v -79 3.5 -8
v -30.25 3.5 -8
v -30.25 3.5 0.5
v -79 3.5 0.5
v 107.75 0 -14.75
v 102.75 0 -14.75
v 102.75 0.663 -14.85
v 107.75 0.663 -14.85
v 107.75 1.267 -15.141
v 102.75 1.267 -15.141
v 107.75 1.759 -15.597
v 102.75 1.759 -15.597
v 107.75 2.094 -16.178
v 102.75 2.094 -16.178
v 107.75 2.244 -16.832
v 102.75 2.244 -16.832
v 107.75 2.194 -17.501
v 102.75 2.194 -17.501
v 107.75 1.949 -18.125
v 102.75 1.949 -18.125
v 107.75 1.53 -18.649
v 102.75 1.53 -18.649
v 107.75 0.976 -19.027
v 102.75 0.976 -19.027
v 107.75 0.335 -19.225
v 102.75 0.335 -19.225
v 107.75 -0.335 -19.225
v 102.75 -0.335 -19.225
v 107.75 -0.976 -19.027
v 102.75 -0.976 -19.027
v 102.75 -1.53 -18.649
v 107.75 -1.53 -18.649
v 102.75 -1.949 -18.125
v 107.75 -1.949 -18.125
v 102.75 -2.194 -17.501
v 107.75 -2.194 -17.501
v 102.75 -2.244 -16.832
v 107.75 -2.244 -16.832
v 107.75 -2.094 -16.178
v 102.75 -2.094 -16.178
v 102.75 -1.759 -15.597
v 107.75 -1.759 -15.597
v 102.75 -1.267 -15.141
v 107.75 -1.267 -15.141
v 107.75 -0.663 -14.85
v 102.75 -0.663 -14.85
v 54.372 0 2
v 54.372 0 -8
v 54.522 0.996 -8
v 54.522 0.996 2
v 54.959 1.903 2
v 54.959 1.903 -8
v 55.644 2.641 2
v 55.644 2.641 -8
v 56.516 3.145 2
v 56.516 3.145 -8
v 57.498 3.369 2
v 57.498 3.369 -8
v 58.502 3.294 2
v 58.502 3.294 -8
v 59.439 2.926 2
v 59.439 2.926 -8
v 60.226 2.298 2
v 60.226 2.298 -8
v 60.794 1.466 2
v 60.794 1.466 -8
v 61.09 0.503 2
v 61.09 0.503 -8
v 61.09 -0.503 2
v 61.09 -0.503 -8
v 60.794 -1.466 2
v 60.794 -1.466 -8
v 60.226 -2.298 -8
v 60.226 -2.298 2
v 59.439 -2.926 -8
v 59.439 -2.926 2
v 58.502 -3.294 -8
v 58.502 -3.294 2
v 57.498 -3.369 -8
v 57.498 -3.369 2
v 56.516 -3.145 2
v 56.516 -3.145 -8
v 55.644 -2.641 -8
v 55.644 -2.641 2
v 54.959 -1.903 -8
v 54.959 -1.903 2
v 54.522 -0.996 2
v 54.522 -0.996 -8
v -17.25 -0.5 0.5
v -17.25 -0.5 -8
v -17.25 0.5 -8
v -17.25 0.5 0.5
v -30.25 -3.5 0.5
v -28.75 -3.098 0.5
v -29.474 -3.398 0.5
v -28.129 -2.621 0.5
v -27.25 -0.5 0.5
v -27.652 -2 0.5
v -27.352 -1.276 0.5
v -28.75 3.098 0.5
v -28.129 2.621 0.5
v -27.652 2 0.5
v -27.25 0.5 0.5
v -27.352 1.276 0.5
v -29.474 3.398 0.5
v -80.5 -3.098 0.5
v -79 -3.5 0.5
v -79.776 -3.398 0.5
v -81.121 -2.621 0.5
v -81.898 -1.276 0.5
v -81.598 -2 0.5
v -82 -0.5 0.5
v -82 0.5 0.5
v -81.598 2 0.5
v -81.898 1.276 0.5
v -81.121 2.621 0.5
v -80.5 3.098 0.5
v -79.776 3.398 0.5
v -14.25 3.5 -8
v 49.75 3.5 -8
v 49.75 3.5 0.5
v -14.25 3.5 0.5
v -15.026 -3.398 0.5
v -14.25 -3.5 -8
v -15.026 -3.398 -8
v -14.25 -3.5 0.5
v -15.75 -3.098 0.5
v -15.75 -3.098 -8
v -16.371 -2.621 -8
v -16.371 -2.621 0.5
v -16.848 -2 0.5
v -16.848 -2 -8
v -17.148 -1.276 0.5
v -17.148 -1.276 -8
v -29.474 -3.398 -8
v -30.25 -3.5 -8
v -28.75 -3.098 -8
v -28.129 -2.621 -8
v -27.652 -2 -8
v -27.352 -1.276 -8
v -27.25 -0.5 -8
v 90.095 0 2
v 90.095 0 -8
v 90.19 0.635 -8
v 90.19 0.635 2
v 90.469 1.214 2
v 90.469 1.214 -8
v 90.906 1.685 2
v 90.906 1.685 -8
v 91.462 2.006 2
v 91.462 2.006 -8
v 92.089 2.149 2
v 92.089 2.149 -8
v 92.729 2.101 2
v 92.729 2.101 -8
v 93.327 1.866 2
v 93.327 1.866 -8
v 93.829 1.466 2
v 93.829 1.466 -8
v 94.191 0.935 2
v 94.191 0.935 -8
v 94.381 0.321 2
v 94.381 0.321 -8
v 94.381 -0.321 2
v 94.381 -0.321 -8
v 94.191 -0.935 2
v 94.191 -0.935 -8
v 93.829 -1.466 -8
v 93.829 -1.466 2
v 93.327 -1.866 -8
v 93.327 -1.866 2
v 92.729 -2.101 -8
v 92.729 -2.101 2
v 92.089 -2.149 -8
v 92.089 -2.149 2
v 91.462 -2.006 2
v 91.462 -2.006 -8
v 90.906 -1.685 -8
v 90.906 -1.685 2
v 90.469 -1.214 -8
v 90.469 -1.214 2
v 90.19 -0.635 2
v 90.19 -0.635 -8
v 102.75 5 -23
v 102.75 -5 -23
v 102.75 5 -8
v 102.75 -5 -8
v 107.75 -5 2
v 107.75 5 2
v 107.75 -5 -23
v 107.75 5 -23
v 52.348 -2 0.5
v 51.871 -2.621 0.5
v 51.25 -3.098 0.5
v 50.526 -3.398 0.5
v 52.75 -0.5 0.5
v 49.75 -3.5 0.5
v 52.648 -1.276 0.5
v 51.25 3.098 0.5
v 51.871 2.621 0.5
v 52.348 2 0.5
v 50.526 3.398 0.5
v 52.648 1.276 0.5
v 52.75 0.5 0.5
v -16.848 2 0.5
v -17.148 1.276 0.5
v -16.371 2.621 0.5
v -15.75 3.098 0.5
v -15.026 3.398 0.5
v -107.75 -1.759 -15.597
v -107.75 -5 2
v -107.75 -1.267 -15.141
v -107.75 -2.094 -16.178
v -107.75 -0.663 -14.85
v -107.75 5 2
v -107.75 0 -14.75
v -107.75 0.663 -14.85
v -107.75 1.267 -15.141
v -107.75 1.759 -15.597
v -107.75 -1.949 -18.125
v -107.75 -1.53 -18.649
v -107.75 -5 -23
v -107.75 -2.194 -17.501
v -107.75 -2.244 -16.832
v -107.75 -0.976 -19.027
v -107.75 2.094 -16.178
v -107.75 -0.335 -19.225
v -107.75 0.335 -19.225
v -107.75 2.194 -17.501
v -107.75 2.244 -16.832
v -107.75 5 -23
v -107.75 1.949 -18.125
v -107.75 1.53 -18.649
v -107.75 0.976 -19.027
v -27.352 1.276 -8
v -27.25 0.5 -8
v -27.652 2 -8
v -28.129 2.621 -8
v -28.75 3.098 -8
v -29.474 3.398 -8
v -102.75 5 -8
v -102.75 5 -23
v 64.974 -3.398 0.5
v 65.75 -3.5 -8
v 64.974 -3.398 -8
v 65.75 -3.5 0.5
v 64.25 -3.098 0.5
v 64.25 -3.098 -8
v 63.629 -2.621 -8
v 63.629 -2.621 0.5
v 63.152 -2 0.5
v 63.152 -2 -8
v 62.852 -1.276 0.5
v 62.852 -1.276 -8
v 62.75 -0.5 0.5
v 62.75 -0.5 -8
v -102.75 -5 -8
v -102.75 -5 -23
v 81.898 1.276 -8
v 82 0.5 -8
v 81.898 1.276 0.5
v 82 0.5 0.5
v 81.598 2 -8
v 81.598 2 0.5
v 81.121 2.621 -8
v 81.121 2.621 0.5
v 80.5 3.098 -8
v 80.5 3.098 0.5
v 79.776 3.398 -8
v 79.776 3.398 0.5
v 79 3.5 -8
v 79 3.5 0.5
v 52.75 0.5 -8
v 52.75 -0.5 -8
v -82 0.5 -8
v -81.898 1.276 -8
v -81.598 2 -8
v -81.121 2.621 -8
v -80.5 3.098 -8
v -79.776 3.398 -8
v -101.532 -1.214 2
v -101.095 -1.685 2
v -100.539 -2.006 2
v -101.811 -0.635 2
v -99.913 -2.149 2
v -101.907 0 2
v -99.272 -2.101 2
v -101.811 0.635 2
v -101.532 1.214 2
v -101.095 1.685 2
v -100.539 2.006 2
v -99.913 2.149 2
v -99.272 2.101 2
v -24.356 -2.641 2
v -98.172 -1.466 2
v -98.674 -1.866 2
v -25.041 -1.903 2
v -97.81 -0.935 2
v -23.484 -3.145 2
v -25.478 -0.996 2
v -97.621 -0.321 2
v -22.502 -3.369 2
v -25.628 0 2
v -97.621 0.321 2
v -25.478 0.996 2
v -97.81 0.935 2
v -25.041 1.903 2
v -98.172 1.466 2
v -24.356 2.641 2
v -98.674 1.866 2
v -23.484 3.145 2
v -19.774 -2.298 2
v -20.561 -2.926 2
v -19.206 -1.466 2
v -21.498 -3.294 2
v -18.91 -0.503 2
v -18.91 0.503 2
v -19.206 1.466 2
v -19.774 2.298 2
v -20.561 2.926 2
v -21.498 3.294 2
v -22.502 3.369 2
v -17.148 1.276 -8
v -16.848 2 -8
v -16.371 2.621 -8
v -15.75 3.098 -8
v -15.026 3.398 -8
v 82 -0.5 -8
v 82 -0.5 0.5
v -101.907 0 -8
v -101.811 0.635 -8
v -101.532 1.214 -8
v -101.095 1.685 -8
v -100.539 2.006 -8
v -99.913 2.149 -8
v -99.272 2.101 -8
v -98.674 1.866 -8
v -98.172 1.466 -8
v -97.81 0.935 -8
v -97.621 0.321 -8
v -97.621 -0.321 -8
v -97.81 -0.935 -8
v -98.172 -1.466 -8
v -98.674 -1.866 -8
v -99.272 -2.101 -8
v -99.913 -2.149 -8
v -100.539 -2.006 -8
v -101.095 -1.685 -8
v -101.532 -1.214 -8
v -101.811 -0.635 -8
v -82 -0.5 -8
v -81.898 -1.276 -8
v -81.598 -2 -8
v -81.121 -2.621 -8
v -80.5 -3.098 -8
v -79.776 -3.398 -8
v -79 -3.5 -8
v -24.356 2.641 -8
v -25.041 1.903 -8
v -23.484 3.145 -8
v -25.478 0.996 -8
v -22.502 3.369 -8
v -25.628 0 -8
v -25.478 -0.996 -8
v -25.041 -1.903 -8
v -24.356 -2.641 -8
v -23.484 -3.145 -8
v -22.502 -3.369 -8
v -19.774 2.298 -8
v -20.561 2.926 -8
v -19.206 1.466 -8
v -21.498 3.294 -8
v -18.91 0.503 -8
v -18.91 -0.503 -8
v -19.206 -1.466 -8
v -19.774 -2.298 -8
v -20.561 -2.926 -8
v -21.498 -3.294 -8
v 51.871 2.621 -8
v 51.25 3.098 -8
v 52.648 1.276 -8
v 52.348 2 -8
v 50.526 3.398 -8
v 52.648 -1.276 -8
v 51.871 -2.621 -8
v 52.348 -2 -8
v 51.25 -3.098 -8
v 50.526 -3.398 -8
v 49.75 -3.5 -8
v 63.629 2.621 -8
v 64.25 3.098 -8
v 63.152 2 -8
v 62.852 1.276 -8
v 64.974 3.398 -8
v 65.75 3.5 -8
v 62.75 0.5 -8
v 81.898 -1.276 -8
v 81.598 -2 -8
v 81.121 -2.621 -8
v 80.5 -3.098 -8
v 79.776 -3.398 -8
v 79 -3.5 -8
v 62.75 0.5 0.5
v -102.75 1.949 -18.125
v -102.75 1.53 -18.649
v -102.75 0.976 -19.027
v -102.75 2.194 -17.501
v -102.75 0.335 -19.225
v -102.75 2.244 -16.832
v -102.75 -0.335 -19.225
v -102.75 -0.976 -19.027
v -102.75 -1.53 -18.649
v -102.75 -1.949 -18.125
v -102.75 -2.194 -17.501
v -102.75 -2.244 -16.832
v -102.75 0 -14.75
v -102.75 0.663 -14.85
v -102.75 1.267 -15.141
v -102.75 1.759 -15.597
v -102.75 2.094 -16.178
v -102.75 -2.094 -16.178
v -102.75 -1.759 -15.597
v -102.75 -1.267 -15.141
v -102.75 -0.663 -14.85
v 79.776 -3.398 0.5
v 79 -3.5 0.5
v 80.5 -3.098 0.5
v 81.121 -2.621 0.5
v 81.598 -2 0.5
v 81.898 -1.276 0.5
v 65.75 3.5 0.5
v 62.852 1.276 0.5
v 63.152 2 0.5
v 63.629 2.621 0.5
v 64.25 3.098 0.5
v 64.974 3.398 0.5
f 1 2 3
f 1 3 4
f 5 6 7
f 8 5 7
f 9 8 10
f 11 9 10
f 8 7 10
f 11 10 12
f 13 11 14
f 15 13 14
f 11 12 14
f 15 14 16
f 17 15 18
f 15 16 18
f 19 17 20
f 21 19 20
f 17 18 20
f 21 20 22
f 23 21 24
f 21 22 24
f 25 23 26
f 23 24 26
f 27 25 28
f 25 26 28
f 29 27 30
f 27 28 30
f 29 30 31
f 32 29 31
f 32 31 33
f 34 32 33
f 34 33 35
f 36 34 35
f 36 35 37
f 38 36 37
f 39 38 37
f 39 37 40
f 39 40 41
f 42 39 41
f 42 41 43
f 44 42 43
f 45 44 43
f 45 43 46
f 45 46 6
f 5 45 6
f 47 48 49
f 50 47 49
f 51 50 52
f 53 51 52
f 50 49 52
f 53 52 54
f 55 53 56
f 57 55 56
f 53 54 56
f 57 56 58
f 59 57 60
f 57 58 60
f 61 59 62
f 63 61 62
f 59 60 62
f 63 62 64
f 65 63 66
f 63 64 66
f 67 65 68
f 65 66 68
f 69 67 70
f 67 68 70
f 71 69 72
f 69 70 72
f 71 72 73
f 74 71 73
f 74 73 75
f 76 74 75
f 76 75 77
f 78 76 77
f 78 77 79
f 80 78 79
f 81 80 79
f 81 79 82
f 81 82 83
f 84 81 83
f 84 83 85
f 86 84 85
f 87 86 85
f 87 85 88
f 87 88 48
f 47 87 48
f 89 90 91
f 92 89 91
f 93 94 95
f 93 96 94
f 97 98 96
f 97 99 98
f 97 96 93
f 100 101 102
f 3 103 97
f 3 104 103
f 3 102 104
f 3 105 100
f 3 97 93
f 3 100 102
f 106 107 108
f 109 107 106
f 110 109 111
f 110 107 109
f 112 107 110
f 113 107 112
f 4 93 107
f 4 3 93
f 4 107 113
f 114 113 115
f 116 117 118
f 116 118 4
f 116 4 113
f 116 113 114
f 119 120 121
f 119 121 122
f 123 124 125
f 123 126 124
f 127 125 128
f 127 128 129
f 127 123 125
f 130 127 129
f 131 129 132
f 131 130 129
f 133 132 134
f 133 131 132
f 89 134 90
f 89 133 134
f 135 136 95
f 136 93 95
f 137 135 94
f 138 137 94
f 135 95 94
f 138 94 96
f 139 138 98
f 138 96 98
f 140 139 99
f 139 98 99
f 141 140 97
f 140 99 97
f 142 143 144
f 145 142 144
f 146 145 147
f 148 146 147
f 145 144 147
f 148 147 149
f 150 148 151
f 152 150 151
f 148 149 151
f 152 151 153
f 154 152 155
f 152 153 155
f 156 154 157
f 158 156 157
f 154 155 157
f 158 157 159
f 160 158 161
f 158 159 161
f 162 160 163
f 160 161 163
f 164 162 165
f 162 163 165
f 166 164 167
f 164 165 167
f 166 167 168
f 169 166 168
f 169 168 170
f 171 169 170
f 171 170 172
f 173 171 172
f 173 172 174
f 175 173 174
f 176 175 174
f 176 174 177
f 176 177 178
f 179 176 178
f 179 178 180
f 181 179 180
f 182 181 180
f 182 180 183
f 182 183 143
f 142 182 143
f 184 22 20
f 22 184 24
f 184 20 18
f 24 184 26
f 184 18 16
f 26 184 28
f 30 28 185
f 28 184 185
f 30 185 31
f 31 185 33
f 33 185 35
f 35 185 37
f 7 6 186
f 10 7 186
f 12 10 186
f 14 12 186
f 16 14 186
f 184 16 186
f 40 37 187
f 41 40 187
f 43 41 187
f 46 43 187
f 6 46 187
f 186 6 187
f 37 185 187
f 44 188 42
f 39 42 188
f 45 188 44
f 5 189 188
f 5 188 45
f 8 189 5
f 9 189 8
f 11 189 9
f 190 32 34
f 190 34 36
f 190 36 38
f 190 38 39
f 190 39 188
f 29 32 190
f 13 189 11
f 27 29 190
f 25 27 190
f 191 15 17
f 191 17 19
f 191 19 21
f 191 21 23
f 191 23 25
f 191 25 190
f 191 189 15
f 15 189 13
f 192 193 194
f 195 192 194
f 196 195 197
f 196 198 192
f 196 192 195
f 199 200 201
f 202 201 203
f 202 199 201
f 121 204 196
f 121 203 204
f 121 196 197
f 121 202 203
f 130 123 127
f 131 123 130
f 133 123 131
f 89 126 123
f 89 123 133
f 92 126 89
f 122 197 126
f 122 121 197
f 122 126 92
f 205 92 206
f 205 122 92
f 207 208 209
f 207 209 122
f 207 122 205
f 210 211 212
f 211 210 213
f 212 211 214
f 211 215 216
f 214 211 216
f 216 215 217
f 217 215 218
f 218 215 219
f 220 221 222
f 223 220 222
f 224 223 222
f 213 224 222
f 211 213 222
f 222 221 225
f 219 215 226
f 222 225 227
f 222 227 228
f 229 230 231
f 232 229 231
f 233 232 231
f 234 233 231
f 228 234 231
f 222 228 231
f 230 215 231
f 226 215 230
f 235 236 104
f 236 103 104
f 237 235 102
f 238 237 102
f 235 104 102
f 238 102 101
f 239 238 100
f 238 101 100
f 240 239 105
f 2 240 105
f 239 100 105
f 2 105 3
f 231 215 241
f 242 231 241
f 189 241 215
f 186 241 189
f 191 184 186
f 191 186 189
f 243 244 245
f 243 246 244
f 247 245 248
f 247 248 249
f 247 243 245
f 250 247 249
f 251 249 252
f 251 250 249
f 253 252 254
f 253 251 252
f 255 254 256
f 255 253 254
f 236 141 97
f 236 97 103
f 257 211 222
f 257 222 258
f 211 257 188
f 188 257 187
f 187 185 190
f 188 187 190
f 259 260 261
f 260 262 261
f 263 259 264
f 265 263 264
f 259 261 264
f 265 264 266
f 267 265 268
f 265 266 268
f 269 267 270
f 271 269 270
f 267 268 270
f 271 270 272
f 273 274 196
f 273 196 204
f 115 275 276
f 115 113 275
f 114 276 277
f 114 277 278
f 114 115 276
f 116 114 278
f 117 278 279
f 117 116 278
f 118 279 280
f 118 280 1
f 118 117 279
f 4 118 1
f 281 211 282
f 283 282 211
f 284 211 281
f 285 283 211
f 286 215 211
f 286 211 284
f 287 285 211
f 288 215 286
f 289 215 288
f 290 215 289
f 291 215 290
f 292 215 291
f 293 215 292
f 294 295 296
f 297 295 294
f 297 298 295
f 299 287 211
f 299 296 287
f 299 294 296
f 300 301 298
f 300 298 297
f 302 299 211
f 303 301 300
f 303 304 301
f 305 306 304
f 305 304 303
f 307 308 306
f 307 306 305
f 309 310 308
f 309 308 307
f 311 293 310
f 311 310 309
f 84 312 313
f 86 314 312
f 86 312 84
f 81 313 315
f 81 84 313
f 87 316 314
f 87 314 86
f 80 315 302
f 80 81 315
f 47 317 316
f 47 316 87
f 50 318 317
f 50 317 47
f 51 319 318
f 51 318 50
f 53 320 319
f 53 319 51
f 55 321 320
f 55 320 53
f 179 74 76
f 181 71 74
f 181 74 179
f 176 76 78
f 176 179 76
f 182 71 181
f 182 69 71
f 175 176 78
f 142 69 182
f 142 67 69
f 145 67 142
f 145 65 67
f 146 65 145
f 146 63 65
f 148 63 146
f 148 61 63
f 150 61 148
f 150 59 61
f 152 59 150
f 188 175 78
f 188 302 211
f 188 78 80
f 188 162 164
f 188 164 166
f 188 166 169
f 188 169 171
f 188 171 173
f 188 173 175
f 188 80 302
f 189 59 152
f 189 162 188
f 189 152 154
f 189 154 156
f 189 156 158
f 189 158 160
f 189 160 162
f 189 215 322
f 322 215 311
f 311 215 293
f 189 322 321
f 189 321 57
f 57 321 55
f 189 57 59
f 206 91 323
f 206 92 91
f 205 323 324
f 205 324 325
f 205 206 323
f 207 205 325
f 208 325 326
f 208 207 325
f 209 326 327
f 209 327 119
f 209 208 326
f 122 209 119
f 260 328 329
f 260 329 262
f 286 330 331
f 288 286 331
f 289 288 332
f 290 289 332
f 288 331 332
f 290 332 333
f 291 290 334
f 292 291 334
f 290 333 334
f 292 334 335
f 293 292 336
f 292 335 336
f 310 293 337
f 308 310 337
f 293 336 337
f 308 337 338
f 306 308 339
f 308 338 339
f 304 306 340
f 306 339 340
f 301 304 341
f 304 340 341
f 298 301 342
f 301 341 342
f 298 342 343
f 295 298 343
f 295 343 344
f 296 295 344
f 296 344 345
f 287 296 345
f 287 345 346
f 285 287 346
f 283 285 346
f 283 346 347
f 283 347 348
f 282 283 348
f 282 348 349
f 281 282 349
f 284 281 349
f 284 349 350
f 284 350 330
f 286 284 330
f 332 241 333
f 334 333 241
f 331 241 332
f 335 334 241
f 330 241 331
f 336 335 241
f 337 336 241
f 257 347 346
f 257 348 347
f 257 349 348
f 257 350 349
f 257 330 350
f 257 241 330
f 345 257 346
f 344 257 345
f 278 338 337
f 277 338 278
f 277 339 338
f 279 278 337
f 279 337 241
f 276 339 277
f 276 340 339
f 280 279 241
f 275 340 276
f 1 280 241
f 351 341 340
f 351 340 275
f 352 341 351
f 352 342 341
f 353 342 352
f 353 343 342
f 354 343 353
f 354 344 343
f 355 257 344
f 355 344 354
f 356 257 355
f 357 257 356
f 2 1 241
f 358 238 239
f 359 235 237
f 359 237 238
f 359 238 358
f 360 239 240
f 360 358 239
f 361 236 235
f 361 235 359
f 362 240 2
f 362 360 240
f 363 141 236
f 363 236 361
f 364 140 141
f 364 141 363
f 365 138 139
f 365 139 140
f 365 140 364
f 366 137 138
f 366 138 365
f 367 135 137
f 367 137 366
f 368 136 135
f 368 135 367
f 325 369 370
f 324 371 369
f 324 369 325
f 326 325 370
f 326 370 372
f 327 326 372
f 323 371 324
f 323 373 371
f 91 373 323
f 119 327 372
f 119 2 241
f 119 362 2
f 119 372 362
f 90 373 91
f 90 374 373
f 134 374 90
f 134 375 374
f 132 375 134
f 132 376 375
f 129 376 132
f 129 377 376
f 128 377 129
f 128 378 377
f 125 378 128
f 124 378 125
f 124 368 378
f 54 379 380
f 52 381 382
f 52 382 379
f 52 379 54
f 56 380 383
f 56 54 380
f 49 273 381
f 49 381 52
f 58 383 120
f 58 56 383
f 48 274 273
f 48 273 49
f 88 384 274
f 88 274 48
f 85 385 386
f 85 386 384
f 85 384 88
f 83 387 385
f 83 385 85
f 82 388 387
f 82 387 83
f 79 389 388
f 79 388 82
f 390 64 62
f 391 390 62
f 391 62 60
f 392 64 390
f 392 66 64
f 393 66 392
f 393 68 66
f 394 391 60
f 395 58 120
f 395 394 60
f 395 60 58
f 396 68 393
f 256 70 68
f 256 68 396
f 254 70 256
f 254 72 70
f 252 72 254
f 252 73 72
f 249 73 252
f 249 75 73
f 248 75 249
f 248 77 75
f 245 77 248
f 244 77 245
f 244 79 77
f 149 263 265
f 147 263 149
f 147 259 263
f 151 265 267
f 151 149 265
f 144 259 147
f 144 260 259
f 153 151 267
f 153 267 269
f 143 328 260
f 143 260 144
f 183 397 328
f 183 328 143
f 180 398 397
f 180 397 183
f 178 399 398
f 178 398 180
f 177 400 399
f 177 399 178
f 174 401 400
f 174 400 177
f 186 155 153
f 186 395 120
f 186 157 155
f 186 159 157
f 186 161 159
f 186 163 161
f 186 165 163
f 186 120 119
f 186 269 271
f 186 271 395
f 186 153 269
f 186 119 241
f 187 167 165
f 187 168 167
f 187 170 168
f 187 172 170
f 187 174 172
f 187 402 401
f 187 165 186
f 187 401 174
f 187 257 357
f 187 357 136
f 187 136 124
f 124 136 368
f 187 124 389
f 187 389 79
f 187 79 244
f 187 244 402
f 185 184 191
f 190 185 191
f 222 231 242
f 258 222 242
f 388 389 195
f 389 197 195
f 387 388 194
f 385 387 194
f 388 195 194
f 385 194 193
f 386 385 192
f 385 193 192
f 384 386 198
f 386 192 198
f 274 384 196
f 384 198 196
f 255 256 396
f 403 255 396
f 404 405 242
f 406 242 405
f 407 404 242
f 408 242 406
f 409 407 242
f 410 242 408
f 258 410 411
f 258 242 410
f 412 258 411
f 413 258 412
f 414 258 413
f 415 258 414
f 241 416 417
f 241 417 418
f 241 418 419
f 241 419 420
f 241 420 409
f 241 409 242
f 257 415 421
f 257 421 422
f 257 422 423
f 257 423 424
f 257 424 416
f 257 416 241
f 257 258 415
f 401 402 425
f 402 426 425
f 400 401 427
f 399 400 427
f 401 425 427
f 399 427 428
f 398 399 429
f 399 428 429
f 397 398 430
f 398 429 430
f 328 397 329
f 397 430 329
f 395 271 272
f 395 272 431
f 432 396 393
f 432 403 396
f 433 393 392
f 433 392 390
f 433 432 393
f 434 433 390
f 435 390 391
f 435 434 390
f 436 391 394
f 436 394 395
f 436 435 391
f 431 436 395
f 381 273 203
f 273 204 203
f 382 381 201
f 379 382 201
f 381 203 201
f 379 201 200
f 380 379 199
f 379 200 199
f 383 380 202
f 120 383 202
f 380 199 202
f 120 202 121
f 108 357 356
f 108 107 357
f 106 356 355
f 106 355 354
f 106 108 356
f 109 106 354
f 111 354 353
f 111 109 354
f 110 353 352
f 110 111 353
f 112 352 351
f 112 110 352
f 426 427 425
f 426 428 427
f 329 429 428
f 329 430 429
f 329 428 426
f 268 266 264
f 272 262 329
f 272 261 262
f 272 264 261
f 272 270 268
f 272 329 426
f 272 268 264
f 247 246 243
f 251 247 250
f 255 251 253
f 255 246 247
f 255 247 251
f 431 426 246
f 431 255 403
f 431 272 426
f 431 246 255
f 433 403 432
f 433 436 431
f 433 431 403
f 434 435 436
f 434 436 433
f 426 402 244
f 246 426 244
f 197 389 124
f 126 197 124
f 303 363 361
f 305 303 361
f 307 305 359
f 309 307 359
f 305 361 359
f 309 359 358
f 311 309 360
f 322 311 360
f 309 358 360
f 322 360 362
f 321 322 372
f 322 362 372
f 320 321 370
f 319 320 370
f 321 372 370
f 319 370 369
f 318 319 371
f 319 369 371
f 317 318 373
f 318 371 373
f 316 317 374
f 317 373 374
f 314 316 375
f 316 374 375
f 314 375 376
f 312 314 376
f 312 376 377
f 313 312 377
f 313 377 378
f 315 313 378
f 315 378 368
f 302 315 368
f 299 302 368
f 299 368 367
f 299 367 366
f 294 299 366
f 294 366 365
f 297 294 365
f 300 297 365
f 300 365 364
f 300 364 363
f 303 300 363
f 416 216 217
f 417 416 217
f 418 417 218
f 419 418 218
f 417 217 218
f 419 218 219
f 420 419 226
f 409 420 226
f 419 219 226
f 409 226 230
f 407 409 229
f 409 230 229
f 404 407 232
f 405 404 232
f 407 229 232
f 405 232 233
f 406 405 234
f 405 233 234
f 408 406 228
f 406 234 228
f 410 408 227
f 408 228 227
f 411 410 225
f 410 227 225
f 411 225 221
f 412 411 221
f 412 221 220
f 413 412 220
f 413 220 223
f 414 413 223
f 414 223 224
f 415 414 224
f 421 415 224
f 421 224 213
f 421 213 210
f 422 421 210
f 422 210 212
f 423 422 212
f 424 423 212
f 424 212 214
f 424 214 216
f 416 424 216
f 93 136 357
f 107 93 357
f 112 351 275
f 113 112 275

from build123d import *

# Parameters (mm, degrees)
SKETCH1_W                              = 215.5
SKETCH1_H                              = 25
BOSS_EXTRUDE1_DEPTH                    = 10
SKETCH2_W                              = 205.5
SKETCH2_H                              = 15
CUT_EXTRUDE1_DEPTH                     = 11
SKETCH3_W                              = 70
SKETCH3_H                              = 7
CUT_EXTRUDE2_DEPTH                     = 8.5
SKETCH4_W                              = 54.75
SKETCH4_H                              = 7
CUT_EXTRUDE3_DEPTH                     = 8.5
SKETCH5_W                              = 19.25
SKETCH5_H                              = 7
CUT_EXTRUDE4_DEPTH                     = 8.5
F_4_5_4_5_DIAMETER_HOLE1_D             = 4.5
F_4_5_4_5_DIAMETER_HOLE1_DEPTH         = 5
M4_CLEARANCE_HOLE1_D                   = 4.31
TAPPED_HOLE_FOR_1_4_20_HELICOIL1_D     = 6.7564
TAPPED_HOLE_FOR_1_4_20_HELICOIL1_DEPTH = 20.523
TAPPED_HOLE_FOR_1_4_20_HELICOIL1_TIP   = 2.029827343
F_4_5_4_5_DIAMETER_HOLE2_D             = 4.5
F_4_5_4_5_DIAMETER_HOLE2_DEPTH         = 215.5
FILLET1_R                              = 3


with BuildPart() as part:
    # Sketch1 → Boss-Extrude1 (new body)
    with BuildSketch(Plane(origin=(0, 5, 0), x_dir=(1, 0, 0), z_dir=(0, 1, 0))):
        with Locations((0, 10.5)):
            Rectangle(SKETCH1_W, SKETCH1_H)
    extrude(amount=-BOSS_EXTRUDE1_DEPTH)

    # Sketch2 → Cut-Extrude1 (cut, through all)
    with BuildSketch(Plane.XZ.offset(5)):
        with Locations((0, -15.5)):
            Rectangle(SKETCH2_W, SKETCH2_H)
    extrude(amount=-CUT_EXTRUDE1_DEPTH, mode=Mode.SUBTRACT)

    # Sketch3 → Cut-Extrude2 (cut)
    with BuildSketch(Plane(origin=(0, 0, -8), x_dir=(-1, 0, 0), z_dir=(0, 0, -1))):
        with Locations((-17.75, 0)):
            Rectangle(SKETCH3_W, SKETCH3_H)
    extrude(amount=-CUT_EXTRUDE2_DEPTH, mode=Mode.SUBTRACT)

    # Sketch4 → Cut-Extrude3 (cut)
    with BuildSketch(Plane(origin=(0, 0, -8), x_dir=(-1, 0, 0), z_dir=(0, 0, -1))):
        with Locations((54.625, 0)):
            Rectangle(SKETCH4_W, SKETCH4_H)
    extrude(amount=-CUT_EXTRUDE3_DEPTH, mode=Mode.SUBTRACT)

    # Sketch5 → Cut-Extrude4 (cut)
    with BuildSketch(Plane(origin=(0, 0, -8), x_dir=(-1, 0, 0), z_dir=(0, 0, -1))):
        with Locations((-72.375, 0)):
            Rectangle(SKETCH5_W, SKETCH5_H)
    extrude(amount=-CUT_EXTRUDE4_DEPTH, mode=Mode.SUBTRACT)

    # Ø4.5 (4.5) Diameter Hole1
    with Locations(Plane(origin=(-102.75, 0, 0), x_dir=(0, 0, -1), z_dir=(1, 0, 0))):
        with Locations((17, 0)):
            Hole(F_4_5_4_5_DIAMETER_HOLE1_D / 2, depth=F_4_5_4_5_DIAMETER_HOLE1_DEPTH)

    # M4 Clearance Hole1 (through all)
    with Locations(Plane.XY.offset(2)):
        with Locations((-99.75154, 0), (92.2496, 0)):
            Hole(M4_CLEARANCE_HOLE1_D / 2)

    # Tapped Hole for 1/4-20 Helicoil1
    with Locations(Plane.XY.offset(2)):
        with Locations((57.75, 0), (-22.25, 0)):
            Hole(TAPPED_HOLE_FOR_1_4_20_HELICOIL1_D / 2, depth=TAPPED_HOLE_FOR_1_4_20_HELICOIL1_DEPTH)
            with Locations((0, 0, -(TAPPED_HOLE_FOR_1_4_20_HELICOIL1_DEPTH + TAPPED_HOLE_FOR_1_4_20_HELICOIL1_TIP / 2))):  # 118° drill point
                Cone(0, TAPPED_HOLE_FOR_1_4_20_HELICOIL1_D / 2, TAPPED_HOLE_FOR_1_4_20_HELICOIL1_TIP, mode=Mode.SUBTRACT)

    # Ø4.5 (4.5) Diameter Hole2
    with Locations(Plane(origin=(107.75, 0, 0), x_dir=(0, 0, -1), z_dir=(1, 0, 0))):
        with Locations((17, 0)):
            Hole(F_4_5_4_5_DIAMETER_HOLE2_D / 2, depth=F_4_5_4_5_DIAMETER_HOLE2_DEPTH)

    # Fillet1
    fillet1_edges = [part.edges().sort_by_distance(p)[0] for p in [
        (-17.25, 3.5, -3.75),
        (-17.25, -3.5, -3.75),
        (52.75, -3.5, -3.75),
        (52.75, 3.5, -3.75),
        (-82, 3.5, -3.75),
        (-82, -3.5, -3.75),
        (-27.25, -3.5, -3.75),
        (-27.25, 3.5, -3.75),
        (62.75, -3.5, -3.75),
        (82, -3.5, -3.75),
        (82, 3.5, -3.75),
        (62.75, 3.5, -3.75),
    ]]
    fillet(fillet1_edges, radius=FILLET1_R)


solid = part.part
